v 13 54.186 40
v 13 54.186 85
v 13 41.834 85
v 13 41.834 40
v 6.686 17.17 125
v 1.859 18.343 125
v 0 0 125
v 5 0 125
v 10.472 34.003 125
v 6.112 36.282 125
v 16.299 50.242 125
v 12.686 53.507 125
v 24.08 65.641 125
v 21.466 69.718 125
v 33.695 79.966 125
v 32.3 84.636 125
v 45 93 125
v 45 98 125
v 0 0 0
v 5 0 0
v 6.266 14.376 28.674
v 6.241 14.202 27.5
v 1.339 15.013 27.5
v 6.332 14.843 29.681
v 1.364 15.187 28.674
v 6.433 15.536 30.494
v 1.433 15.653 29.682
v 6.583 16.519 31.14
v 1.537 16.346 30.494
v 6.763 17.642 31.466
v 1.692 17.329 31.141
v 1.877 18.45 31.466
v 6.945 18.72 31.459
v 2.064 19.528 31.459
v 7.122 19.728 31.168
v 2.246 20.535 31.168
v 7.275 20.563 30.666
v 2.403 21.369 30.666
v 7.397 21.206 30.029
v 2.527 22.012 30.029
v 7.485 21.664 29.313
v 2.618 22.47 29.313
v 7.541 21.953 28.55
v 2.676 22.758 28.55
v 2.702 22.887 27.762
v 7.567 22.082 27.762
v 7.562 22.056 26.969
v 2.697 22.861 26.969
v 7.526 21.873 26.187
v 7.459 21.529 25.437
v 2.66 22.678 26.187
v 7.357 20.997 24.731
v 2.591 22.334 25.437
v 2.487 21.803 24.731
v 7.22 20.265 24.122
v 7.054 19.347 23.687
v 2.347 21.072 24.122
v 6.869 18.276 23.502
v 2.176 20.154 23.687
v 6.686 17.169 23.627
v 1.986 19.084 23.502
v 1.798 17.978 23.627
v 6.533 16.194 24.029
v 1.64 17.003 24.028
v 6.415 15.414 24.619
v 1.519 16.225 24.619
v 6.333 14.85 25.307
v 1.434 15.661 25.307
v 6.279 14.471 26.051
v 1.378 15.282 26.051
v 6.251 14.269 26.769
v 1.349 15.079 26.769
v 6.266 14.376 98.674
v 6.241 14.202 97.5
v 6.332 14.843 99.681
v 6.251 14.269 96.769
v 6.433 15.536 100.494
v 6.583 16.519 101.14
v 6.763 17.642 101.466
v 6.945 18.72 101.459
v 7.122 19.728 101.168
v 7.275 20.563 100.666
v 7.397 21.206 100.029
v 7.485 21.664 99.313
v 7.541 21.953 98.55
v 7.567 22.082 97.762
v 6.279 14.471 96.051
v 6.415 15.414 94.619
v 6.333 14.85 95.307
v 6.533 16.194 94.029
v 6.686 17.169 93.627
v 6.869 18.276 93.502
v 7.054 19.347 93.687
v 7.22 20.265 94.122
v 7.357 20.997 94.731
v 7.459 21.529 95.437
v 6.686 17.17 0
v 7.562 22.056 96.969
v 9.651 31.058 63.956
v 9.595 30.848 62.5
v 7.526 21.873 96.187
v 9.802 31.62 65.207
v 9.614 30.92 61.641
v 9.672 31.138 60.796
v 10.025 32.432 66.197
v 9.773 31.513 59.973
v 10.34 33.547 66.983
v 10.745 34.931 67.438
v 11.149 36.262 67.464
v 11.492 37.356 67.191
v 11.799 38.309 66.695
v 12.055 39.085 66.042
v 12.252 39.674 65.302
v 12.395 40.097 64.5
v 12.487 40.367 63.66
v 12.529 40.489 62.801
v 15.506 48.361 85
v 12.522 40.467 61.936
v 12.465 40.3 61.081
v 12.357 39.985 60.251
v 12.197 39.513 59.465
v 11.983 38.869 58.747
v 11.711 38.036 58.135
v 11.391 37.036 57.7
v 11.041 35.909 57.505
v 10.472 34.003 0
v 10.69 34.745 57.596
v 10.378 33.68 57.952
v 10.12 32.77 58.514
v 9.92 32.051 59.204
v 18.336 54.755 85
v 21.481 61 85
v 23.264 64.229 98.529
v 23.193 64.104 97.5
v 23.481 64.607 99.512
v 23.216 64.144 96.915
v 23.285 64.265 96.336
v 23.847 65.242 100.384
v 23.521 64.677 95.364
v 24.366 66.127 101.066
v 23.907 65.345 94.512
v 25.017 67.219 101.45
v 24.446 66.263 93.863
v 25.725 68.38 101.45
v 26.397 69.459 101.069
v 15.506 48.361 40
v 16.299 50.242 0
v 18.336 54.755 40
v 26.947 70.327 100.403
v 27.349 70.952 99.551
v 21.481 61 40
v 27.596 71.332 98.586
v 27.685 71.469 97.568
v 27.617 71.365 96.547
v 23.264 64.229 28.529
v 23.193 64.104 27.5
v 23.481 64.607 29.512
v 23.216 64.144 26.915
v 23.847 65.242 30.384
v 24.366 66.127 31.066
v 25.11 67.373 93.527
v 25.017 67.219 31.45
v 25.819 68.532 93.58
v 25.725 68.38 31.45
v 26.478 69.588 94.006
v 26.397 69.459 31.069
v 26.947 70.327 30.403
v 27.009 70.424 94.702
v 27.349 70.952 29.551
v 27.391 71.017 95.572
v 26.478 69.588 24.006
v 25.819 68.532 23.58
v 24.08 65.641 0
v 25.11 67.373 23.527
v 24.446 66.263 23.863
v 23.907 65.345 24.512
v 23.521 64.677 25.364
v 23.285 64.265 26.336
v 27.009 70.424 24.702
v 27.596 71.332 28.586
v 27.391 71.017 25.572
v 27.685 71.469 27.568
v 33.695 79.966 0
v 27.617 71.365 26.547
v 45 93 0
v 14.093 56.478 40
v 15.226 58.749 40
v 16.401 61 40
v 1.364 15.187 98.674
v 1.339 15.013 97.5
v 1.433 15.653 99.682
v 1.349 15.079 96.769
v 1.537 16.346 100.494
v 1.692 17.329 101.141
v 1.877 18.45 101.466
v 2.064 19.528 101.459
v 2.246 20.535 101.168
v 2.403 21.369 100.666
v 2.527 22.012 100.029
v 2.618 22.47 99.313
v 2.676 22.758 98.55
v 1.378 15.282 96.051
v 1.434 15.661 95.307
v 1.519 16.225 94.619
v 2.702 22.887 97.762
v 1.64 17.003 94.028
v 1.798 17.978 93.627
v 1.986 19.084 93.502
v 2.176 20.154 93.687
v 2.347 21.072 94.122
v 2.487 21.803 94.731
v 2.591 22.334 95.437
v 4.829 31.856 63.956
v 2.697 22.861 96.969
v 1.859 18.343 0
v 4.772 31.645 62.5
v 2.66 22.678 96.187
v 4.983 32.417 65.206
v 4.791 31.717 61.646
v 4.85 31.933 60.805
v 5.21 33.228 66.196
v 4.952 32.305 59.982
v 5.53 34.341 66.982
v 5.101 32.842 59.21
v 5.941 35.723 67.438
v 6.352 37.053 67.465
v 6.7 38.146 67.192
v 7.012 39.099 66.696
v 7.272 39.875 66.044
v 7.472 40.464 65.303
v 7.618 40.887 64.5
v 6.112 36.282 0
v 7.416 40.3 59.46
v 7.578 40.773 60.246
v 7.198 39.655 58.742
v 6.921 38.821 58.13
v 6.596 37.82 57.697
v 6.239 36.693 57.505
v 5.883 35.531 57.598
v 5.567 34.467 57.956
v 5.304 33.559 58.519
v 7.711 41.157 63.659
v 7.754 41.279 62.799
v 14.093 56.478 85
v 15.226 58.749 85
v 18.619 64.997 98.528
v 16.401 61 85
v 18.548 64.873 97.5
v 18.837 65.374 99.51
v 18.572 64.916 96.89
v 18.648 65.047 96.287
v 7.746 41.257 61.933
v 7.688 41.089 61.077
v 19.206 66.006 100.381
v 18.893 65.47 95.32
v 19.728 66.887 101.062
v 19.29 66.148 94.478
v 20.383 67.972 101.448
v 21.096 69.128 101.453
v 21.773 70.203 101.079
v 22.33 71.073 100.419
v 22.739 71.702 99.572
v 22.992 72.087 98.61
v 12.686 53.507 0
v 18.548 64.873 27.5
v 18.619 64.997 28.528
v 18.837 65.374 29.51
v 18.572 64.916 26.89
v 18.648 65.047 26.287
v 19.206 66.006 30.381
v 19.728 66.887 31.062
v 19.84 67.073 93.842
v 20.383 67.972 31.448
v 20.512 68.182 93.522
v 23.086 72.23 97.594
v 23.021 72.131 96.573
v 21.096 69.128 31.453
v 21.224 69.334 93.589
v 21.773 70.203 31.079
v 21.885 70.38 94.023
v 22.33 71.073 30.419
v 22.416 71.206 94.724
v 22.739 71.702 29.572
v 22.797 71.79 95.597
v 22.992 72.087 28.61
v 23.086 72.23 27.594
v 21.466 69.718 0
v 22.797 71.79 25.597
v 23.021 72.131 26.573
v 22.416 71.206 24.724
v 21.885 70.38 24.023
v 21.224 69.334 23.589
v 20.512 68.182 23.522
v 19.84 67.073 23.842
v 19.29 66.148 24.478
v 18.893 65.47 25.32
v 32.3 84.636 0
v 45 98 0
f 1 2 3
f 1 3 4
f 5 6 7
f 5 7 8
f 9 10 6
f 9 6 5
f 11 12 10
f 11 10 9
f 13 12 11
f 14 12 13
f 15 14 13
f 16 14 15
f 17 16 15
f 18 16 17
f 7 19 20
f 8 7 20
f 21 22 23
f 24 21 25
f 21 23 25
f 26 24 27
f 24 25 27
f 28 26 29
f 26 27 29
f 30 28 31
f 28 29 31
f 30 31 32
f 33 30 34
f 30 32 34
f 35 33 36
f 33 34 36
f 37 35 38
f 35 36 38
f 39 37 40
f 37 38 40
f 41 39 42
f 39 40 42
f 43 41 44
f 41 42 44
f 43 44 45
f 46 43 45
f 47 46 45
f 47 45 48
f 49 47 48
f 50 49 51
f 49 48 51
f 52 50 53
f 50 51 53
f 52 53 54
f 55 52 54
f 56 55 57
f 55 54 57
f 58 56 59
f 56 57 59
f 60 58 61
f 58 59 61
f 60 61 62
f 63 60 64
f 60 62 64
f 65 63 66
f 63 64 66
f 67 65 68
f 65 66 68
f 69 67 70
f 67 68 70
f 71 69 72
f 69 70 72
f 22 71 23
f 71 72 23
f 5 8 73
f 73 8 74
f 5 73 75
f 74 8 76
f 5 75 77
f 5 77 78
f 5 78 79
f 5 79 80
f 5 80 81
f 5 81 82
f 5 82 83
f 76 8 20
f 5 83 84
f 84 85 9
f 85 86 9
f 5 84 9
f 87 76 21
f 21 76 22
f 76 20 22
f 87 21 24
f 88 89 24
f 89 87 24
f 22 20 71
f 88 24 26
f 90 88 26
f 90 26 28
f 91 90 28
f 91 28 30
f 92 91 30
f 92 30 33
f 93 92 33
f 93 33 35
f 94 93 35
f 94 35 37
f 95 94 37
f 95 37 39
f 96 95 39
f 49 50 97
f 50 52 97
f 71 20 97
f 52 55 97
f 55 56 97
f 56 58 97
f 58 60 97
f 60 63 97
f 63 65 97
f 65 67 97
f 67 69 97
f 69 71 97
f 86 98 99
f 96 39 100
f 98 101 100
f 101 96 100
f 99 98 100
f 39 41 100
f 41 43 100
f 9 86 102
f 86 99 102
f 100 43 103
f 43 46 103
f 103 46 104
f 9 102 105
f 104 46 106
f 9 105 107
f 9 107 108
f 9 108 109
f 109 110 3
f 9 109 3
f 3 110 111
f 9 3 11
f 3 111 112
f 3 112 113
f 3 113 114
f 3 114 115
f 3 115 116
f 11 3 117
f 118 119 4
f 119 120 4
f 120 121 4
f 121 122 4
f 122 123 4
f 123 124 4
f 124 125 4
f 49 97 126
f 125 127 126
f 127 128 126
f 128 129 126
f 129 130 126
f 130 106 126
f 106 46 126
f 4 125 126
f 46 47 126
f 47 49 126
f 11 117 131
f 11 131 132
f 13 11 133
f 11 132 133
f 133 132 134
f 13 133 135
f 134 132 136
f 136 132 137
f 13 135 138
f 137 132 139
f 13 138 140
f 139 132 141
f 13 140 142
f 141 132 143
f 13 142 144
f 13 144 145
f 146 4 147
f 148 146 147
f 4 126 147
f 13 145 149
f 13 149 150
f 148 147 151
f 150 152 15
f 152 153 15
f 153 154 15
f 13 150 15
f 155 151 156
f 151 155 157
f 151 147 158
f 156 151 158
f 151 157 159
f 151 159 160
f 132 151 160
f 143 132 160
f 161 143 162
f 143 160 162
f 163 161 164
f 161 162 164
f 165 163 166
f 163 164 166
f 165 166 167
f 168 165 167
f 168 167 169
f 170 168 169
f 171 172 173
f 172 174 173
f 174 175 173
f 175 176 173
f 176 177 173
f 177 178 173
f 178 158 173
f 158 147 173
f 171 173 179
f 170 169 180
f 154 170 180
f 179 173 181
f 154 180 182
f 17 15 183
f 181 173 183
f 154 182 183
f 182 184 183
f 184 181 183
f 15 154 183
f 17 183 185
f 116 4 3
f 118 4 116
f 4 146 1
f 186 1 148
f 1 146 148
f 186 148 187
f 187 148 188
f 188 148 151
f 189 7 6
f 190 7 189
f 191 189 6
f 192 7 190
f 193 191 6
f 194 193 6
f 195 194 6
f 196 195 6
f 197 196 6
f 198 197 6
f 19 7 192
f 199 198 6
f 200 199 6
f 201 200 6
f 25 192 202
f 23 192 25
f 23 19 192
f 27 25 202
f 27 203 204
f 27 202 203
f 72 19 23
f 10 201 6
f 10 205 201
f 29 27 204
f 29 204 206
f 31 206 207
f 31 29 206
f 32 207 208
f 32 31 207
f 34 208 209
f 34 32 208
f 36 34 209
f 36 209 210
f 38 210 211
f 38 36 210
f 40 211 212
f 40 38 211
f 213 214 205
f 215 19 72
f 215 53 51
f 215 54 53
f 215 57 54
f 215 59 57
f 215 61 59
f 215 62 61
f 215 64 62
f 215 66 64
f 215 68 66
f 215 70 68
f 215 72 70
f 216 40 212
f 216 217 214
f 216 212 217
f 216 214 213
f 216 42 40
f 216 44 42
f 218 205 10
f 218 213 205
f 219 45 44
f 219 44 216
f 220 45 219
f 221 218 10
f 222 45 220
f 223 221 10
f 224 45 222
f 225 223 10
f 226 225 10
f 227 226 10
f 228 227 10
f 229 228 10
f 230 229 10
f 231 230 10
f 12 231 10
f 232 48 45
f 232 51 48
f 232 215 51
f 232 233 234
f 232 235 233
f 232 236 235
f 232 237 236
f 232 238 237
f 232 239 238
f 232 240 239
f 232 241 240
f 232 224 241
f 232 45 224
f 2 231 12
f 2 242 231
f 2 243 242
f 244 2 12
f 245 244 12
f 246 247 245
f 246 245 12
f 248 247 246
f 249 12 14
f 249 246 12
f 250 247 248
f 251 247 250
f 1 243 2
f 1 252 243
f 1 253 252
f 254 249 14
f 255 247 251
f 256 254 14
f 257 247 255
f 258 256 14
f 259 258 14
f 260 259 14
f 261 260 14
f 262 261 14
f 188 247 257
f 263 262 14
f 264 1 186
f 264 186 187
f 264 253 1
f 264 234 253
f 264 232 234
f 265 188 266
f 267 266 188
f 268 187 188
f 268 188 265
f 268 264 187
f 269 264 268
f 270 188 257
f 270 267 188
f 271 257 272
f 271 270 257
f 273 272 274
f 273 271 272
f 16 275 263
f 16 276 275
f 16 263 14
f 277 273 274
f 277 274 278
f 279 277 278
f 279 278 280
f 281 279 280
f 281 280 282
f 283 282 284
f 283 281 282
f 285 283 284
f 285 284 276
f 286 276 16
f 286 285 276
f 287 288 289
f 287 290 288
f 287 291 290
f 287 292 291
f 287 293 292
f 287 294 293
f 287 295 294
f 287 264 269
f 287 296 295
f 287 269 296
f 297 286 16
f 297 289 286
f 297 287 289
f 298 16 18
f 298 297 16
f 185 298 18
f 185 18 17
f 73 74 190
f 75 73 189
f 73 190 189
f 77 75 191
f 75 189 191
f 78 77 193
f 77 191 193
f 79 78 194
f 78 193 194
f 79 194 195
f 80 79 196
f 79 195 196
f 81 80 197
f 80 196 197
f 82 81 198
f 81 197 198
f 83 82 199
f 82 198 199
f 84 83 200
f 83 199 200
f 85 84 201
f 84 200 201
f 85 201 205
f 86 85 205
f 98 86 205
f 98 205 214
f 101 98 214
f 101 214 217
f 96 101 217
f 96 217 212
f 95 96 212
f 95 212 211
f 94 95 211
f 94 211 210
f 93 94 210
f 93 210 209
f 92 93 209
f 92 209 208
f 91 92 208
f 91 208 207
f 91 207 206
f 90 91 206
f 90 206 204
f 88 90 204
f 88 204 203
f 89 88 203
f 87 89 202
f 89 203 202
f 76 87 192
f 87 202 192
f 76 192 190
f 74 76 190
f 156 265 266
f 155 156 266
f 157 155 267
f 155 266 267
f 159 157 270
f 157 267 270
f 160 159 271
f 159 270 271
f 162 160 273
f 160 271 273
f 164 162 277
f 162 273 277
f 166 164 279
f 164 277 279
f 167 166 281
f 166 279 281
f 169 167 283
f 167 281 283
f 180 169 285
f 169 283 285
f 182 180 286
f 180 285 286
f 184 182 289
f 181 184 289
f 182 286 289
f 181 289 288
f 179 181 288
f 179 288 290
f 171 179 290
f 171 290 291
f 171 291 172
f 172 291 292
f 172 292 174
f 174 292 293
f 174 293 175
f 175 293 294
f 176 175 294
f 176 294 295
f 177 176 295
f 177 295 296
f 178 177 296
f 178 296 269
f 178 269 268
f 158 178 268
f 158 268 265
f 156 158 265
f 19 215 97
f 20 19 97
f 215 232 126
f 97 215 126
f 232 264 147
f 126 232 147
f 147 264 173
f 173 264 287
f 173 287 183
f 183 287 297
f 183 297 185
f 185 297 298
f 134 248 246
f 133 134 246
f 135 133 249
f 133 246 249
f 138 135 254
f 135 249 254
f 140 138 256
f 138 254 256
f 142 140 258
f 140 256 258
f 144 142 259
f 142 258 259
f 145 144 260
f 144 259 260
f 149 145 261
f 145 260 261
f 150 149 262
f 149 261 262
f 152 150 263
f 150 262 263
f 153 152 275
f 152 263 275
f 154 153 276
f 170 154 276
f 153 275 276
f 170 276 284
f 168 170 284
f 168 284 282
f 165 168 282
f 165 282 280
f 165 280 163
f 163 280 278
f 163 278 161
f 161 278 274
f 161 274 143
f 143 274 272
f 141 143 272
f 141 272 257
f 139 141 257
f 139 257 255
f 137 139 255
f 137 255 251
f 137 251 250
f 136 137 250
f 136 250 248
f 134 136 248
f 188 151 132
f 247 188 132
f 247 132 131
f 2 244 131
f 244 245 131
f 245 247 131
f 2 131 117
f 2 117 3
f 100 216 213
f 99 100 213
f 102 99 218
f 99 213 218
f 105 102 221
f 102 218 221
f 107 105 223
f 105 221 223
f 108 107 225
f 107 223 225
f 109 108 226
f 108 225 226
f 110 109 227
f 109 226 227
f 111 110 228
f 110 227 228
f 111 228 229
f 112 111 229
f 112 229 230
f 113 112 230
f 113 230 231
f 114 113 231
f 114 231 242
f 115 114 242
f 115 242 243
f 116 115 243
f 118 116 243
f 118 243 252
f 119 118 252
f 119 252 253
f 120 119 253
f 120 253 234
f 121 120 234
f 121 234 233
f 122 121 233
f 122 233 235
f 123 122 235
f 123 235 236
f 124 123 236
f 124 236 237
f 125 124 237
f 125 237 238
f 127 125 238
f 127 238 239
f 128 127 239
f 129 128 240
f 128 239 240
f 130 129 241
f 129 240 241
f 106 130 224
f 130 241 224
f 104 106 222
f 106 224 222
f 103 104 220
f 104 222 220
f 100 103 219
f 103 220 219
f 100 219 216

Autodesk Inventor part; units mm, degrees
ref_plane "YZ Plane" through (0, 0, 0) normal (1, 0, 0) x (0, 1, 0)
sketch "Sketch1" plane through (0, 0, 0) normal (0, 0, 1) x (1, 0, 0)
  arc A0 (45, 98) -> (0, 0) centre (139.9137, -4.9145) ccw
  line L0 (45, 98) -> (45, 93)
  line L1 (0, 0) -> (5, 0)
  arc A1 (45, 93) -> (5, 0) centre (144.908, -5.0734) ccw
  dimension "d0" = 140
  dimension "d1" = 98
  dimension "d3" = 45
  dimension "d4" = 5
  dimension "d5" = 5
  dimension "d6" = 140
extrude "Extrusion1" add sketch "Sketch1" along normal blind 125
ref_plane "Work Plane1" through (0, 0, 62.5) normal (0, 0, -1) x (-1, 0, 0)
ref_plane "Work Plane2" through (-10, 0, 62.5) normal (-0.9866, 0.1632, 0) x (-0.1632, -0.9866, 0)
sketch "Sketch2" plane through (-10, 0, 62.5) normal (-0.9866, 0.1632, 0) x (-0.1632, -0.9866, 0)
  circle A0 centre (-20.6619, -35) radius 4
  circle A1 centre (-72.6619, -35) radius 4
  circle A2 centre (-20.6619, 35) radius 4
  circle A3 centre (-72.6619, 35) radius 4
  line L0 (0, 42.5) -> (0, -42.5)
  line L1 (-72.6619, 35) -> (-20.6619, 35) construction
  line L2 (-20.6619, 35) -> (-20.6619, -35) construction
  line L3 (-20.6619, -35) -> (-72.6619, -35) construction
  line L4 (-72.6619, -35) -> (-72.6619, 35) construction
  line L5 (-105.6619, -42.5) -> (-105.6619, 42.5)
  point P0 (0, 0)
  point P1 (-20.6619, 0)
  point P2 (0, 0)
  dimension "d9" = 8
  dimension "d10" = 8
  dimension "d12" = 52
  dimension "d14" = 8
  dimension "d15" = 8
  dimension "d16" = 70
  dimension "d23" = 33
extrude "Extrusion2" cut sketch "Sketch2" against normal through all
sketch "Sketch4" plane through (-10, 0, 62.5) normal (-0.9866, 0.1632, 0) x (-0.1632, -0.9866, 0)
  circle A0 centre (-38.6319, 0) radius 5
  line L0 (-1.6319, 62.5) -> (-1.6319, -62.5)
  point P0 (-1.6319, 0)
  dimension "d24" = 10
  dimension "d25" = 37
extrude "Extrusion4" cut sketch "Sketch4" against normal through all
sketch "Sketch5" plane through (45, 93, 0) normal (1, 0, 0) x (0, 0, -1)
  line L0 (-40, -32) -> (-85, -32)
  line L1 (-85, -32) -> (-85, -93)
  line L2 (-85, -93) -> (-40, -93)
  line L3 (-40, -93) -> (-40, -32)
  line L4 (0, -93) -> (-125, -93) projected
  line L5 (0, 0) -> (-125, 0) projected
  point P0 (-62.5, -32)
  point P1 (-62.5, -93)
  point P2 (-62.5, -93)
  dimension "d28" = 45
  dimension "d31" = 32
extrude "Extrusion5" cut sketch "Sketch5" against normal blind 32
properties part number "SJ009" material "ABS Plastic"
